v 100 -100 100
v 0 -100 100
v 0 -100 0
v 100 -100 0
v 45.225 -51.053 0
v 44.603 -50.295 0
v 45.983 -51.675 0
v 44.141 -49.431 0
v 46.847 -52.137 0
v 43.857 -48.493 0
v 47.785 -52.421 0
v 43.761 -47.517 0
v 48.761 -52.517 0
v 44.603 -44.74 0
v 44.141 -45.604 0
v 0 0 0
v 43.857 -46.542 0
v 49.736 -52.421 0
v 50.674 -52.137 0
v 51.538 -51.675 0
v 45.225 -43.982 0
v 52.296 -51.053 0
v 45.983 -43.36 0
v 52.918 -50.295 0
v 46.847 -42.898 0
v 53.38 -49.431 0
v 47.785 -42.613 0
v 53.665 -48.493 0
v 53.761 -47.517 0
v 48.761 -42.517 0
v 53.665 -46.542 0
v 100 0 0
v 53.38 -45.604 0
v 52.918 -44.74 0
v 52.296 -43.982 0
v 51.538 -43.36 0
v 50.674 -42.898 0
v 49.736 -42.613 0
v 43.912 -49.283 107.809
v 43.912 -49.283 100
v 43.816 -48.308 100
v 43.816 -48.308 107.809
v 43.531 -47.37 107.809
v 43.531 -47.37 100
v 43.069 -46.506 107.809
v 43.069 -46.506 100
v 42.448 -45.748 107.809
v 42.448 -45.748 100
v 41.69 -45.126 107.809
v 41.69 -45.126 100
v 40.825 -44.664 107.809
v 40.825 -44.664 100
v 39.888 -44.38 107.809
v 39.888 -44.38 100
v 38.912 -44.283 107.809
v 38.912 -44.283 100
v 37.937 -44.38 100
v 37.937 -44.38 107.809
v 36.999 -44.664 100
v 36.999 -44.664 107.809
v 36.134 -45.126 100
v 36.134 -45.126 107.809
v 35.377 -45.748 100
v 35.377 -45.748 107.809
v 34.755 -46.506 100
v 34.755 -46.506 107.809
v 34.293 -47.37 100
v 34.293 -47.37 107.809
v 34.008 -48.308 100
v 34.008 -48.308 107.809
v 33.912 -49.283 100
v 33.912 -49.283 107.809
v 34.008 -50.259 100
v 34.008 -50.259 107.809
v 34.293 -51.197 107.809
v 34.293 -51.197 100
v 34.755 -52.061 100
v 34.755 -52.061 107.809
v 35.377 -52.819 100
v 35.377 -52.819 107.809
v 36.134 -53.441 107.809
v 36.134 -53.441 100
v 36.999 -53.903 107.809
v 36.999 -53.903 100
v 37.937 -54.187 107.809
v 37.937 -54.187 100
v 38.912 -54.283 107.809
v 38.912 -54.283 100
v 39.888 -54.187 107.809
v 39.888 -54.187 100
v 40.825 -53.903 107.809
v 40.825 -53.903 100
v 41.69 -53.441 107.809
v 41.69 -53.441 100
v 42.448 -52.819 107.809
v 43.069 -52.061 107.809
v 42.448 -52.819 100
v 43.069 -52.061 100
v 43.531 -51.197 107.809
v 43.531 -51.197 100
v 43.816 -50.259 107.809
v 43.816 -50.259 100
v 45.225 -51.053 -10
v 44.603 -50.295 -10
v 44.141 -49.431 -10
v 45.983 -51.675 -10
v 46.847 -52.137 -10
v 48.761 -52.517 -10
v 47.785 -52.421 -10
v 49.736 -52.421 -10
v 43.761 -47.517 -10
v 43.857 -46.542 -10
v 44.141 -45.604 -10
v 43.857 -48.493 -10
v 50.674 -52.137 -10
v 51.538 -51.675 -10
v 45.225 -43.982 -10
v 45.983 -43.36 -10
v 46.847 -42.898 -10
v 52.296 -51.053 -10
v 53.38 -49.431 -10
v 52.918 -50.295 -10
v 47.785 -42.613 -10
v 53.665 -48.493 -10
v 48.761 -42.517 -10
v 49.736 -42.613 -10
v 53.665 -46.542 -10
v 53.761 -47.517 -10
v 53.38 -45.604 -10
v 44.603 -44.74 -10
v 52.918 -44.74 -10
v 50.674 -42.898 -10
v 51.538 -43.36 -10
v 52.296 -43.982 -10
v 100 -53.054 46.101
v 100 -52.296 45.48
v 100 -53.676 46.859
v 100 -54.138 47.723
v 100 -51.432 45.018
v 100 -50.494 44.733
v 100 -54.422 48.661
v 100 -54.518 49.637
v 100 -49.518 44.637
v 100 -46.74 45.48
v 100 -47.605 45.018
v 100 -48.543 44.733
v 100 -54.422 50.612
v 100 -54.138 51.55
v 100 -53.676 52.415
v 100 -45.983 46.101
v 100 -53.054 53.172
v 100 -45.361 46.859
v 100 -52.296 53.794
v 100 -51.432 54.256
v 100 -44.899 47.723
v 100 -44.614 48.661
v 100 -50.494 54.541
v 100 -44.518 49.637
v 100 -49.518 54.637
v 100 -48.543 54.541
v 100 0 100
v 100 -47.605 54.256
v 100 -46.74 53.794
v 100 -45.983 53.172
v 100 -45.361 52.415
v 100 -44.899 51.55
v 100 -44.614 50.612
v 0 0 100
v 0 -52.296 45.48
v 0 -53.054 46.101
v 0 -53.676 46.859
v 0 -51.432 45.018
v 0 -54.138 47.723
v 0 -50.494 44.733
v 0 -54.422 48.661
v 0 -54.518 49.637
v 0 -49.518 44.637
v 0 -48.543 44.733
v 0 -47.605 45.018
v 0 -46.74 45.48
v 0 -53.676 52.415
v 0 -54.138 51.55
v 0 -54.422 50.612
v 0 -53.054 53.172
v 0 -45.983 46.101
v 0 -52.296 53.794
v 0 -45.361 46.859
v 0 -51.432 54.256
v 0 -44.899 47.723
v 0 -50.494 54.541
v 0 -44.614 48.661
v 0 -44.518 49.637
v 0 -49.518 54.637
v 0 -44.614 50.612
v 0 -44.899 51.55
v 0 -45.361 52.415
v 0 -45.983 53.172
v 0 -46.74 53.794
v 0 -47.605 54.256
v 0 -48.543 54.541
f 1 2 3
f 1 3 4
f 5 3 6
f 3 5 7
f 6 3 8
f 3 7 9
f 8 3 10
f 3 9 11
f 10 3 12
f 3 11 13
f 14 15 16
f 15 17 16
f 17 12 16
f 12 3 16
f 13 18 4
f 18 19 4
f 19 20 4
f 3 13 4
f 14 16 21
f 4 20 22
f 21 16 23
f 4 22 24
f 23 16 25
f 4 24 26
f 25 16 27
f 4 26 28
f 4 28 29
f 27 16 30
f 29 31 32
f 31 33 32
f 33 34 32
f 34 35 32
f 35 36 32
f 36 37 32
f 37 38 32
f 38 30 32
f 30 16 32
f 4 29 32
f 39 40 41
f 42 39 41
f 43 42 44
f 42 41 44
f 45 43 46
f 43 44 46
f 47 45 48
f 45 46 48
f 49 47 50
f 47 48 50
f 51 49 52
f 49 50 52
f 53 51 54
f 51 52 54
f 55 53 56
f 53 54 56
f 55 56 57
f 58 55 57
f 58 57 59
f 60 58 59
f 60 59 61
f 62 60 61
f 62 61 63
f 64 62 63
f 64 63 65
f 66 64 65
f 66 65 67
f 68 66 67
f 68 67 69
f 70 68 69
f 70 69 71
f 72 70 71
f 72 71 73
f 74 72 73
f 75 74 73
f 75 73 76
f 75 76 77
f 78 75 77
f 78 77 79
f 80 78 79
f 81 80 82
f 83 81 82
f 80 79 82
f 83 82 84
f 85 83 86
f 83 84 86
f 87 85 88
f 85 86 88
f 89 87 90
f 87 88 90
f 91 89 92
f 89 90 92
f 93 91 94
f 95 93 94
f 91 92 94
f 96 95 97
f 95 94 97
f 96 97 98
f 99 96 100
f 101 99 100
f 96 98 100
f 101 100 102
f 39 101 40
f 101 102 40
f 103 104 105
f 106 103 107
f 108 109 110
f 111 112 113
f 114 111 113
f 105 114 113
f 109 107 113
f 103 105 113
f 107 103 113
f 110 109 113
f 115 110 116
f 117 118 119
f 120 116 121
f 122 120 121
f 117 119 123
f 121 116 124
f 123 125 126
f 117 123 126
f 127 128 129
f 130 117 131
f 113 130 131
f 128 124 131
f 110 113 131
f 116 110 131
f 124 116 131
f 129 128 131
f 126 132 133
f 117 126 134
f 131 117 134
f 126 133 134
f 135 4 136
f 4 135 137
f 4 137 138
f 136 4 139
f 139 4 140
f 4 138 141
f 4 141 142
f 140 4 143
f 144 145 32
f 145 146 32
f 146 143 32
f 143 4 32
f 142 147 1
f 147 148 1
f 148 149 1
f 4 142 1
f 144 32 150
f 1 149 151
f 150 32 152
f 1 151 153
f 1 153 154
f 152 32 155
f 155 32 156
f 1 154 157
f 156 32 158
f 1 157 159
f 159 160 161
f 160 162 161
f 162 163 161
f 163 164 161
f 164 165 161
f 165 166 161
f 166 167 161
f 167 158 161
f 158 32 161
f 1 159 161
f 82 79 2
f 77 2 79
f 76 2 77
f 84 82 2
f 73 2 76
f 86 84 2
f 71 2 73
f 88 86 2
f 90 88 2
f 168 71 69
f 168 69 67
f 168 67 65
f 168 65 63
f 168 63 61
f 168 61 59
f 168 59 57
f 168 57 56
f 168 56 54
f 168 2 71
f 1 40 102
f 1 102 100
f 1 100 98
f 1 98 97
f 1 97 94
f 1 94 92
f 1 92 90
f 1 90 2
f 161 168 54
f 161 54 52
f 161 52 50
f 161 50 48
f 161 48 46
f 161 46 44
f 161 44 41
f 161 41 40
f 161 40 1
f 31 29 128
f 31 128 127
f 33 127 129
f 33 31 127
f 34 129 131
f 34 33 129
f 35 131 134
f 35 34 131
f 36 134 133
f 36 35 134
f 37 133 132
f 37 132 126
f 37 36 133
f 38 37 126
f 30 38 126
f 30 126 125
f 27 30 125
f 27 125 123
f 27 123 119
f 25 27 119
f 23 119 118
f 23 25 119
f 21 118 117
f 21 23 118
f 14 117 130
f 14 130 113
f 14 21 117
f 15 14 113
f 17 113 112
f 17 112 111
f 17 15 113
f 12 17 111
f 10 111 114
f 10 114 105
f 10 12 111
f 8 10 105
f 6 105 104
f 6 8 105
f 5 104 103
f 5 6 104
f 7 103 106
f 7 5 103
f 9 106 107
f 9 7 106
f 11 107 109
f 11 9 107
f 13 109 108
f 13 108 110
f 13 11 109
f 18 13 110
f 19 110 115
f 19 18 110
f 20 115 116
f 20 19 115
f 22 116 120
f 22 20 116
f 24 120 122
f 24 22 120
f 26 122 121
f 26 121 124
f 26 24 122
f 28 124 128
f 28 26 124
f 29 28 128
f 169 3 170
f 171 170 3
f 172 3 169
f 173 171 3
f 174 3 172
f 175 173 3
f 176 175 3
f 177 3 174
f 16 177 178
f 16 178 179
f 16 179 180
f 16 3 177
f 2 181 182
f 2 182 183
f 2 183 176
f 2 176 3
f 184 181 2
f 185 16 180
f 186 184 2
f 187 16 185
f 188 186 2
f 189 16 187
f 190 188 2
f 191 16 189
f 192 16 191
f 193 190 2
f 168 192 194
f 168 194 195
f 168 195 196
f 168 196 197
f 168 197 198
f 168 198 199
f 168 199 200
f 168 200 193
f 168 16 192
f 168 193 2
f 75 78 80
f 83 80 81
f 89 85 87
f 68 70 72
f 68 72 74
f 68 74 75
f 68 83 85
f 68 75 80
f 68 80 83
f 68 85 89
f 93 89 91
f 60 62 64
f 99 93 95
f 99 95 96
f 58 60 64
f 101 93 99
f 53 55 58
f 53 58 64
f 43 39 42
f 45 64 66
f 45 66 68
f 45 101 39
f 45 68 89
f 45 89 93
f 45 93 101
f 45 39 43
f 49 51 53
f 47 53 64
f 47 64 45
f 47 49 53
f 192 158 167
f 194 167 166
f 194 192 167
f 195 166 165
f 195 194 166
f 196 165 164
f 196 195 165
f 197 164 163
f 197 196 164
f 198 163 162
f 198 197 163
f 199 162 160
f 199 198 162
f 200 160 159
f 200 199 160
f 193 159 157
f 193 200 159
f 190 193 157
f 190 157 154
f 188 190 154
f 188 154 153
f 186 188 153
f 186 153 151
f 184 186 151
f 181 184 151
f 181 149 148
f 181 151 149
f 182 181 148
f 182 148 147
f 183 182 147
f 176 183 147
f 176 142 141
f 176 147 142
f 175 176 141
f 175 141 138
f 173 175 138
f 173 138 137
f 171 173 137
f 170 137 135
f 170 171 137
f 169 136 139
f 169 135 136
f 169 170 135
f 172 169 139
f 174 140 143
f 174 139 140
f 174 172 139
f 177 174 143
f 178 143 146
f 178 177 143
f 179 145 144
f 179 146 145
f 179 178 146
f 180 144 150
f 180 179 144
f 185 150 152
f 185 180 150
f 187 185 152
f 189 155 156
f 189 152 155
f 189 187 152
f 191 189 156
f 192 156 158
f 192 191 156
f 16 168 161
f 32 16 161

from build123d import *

# Parameters (mm, degrees)
F0_W     = 100
F0_H     = 100
F1_DEPTH = 100
F2_R     = 5
F3_DEPTH = 10
F4_R     = 5
F5_DEPTH = 107.80932
F6_R     = 5
F7_DEPTH = 333.937347


with BuildPart() as f1:
    # F0 (on Front) → F1 (new body)
    with BuildSketch(Plane.XZ):
        with Locations((50, 50)):
            Rectangle(F0_W, F0_H)
    extrude(amount=F1_DEPTH)

    # F2 (on Top) → F3 (join)
    with BuildSketch(Plane.XY):
        with Locations((48.760578, -47.517374)):
            Circle(F2_R)
    extrude(amount=-F3_DEPTH)

    # F4 (on Top) → F5 (join)
    with BuildSketch(Plane.XY):
        with Locations((38.912062, -49.283471)):
            Circle(F4_R)
    extrude(amount=F5_DEPTH)

    # F6 (on Right) → F7 (cut)
    with BuildSketch(Plane.YZ):
        with Locations((-49.518168, 49.6369)):
            Circle(F6_R)
    extrude(amount=F7_DEPTH, mode=Mode.SUBTRACT)


solid = f1.part
